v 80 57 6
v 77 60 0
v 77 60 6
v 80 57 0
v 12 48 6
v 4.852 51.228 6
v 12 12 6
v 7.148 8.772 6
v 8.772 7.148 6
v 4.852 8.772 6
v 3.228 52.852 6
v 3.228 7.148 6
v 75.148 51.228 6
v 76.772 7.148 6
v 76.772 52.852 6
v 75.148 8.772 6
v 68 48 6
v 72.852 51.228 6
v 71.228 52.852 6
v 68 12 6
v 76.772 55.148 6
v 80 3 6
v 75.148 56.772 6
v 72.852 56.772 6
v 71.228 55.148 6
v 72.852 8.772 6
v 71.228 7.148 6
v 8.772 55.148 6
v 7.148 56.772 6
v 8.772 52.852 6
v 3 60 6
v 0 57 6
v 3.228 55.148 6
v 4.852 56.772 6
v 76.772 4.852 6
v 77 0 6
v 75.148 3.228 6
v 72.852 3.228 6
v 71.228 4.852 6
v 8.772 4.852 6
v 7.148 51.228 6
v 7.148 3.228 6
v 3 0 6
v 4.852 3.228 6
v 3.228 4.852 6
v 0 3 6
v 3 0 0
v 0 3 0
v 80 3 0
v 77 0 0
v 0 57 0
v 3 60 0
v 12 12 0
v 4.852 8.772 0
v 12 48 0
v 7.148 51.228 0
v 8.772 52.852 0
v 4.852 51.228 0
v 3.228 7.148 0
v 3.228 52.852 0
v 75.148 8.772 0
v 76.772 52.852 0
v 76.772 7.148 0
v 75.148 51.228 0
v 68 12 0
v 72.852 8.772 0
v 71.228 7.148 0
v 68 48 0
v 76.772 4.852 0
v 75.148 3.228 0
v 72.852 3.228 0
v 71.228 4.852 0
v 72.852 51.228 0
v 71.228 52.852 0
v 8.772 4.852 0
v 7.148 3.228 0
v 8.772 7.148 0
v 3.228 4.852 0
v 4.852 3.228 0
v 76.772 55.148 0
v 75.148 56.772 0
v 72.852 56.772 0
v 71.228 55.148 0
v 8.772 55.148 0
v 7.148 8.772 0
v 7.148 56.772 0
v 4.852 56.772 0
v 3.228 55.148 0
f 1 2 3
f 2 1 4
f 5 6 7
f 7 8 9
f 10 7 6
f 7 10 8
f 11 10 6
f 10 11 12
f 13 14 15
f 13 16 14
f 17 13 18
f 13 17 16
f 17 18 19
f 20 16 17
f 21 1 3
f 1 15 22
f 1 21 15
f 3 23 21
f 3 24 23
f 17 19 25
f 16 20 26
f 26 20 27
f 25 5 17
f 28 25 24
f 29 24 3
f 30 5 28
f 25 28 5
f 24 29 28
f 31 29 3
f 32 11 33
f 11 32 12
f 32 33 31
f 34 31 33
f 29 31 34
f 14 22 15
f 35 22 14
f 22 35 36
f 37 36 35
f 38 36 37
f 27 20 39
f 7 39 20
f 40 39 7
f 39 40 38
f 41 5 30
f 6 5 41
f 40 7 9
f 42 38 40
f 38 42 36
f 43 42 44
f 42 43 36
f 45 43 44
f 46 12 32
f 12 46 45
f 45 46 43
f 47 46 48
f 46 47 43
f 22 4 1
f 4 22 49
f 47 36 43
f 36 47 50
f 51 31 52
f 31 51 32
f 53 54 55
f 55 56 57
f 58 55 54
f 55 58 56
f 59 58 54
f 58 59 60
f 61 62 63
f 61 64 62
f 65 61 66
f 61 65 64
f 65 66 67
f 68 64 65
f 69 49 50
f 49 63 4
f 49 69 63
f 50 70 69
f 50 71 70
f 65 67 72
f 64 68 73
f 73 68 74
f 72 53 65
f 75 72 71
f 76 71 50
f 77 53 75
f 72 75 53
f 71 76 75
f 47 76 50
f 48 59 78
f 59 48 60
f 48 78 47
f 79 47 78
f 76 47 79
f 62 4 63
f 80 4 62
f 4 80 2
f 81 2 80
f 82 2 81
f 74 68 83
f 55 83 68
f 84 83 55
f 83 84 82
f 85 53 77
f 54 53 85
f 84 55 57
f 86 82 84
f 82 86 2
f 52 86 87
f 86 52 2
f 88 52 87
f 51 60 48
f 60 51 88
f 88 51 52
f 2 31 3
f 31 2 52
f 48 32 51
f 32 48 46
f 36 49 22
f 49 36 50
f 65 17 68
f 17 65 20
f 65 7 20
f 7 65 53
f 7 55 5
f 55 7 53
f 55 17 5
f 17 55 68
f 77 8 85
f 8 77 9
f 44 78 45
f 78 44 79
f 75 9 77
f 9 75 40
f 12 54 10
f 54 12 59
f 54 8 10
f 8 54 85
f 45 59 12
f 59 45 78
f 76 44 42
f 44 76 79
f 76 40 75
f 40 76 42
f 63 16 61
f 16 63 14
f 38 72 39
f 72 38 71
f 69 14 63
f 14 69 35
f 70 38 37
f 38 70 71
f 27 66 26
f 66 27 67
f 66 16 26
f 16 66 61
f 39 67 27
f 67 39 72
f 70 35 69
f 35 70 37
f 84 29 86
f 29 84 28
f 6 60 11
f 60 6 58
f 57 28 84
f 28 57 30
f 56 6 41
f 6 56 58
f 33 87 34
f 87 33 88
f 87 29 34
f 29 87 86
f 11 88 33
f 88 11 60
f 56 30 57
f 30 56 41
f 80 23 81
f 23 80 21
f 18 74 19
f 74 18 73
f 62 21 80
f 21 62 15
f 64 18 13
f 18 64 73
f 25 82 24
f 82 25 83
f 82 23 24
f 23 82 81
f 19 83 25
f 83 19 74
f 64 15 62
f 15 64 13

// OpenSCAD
$fn = 32;

// ----------------------------------------------------------------------
// Frame plate: 80 x 60 frame, 12 mm rails
// ----------------------------------------------------------------------

// --- parameters (mm) ---
plate_l = 80;             // plate length, X
plate_w = 60;             // plate width, Y
plate_t = 6;              // plate thickness, Z (extrusion height)
corner_c = 3;             // corner chamfer
frame_bar = 12;           // frame rail width
bolt_r = 3;               // corner bolt window radius
bolt_inset = 6;           // bolt centre inset from the edges

win_l = plate_l - 2 * frame_bar;  // window length
win_w = plate_w - 2 * frame_bar;  // window width
bolt_d = 2 * bolt_r;  // corner hole diameter

profile = [[3, 0], [77, 0], [80, 3], [80, 57], [77, 60], [3, 60], [0, 57], [0, 3]];  // primary outline, 8 points, counter clockwise
void_1 = [[12, 12], [68, 12], [68, 48], [12, 48]];  // the window, 4 points
void_2 = [[8.772, 7.148], [7.148, 8.772], [4.852, 8.772], [3.228, 7.148], [3.228, 4.852], [4.852, 3.228], [7.148, 3.228], [8.772, 4.852]];  // corner bolt window, 8 points
void_3 = [[76.772, 7.148], [75.148, 8.772], [72.852, 8.772], [71.228, 7.148], [71.228, 4.852], [72.852, 3.228], [75.148, 3.228], [76.772, 4.852]];  // corner bolt window, 8 points
void_4 = [[8.772, 55.148], [7.148, 56.772], [4.852, 56.772], [3.228, 55.148], [3.228, 52.852], [4.852, 51.228], [7.148, 51.228], [8.772, 52.852]];  // corner bolt window, 8 points
void_5 = [[76.772, 55.148], [75.148, 56.772], [72.852, 56.772], [71.228, 55.148], [71.228, 52.852], [72.852, 51.228], [75.148, 51.228], [76.772, 52.852]];  // corner bolt window, 8 points

// --- the one profile operation ---
difference() {
  linear_extrude(height = plate_t) polygon(points = profile);
  translate([0, 0, -1])
    linear_extrude(height = plate_t + 2) polygon(points = void_1);
  translate([0, 0, -1])
    linear_extrude(height = plate_t + 2) polygon(points = void_2);
  translate([0, 0, -1])
    linear_extrude(height = plate_t + 2) polygon(points = void_3);
  translate([0, 0, -1])
    linear_extrude(height = plate_t + 2) polygon(points = void_4);
  translate([0, 0, -1])
    linear_extrude(height = plate_t + 2) polygon(points = void_5);
}
